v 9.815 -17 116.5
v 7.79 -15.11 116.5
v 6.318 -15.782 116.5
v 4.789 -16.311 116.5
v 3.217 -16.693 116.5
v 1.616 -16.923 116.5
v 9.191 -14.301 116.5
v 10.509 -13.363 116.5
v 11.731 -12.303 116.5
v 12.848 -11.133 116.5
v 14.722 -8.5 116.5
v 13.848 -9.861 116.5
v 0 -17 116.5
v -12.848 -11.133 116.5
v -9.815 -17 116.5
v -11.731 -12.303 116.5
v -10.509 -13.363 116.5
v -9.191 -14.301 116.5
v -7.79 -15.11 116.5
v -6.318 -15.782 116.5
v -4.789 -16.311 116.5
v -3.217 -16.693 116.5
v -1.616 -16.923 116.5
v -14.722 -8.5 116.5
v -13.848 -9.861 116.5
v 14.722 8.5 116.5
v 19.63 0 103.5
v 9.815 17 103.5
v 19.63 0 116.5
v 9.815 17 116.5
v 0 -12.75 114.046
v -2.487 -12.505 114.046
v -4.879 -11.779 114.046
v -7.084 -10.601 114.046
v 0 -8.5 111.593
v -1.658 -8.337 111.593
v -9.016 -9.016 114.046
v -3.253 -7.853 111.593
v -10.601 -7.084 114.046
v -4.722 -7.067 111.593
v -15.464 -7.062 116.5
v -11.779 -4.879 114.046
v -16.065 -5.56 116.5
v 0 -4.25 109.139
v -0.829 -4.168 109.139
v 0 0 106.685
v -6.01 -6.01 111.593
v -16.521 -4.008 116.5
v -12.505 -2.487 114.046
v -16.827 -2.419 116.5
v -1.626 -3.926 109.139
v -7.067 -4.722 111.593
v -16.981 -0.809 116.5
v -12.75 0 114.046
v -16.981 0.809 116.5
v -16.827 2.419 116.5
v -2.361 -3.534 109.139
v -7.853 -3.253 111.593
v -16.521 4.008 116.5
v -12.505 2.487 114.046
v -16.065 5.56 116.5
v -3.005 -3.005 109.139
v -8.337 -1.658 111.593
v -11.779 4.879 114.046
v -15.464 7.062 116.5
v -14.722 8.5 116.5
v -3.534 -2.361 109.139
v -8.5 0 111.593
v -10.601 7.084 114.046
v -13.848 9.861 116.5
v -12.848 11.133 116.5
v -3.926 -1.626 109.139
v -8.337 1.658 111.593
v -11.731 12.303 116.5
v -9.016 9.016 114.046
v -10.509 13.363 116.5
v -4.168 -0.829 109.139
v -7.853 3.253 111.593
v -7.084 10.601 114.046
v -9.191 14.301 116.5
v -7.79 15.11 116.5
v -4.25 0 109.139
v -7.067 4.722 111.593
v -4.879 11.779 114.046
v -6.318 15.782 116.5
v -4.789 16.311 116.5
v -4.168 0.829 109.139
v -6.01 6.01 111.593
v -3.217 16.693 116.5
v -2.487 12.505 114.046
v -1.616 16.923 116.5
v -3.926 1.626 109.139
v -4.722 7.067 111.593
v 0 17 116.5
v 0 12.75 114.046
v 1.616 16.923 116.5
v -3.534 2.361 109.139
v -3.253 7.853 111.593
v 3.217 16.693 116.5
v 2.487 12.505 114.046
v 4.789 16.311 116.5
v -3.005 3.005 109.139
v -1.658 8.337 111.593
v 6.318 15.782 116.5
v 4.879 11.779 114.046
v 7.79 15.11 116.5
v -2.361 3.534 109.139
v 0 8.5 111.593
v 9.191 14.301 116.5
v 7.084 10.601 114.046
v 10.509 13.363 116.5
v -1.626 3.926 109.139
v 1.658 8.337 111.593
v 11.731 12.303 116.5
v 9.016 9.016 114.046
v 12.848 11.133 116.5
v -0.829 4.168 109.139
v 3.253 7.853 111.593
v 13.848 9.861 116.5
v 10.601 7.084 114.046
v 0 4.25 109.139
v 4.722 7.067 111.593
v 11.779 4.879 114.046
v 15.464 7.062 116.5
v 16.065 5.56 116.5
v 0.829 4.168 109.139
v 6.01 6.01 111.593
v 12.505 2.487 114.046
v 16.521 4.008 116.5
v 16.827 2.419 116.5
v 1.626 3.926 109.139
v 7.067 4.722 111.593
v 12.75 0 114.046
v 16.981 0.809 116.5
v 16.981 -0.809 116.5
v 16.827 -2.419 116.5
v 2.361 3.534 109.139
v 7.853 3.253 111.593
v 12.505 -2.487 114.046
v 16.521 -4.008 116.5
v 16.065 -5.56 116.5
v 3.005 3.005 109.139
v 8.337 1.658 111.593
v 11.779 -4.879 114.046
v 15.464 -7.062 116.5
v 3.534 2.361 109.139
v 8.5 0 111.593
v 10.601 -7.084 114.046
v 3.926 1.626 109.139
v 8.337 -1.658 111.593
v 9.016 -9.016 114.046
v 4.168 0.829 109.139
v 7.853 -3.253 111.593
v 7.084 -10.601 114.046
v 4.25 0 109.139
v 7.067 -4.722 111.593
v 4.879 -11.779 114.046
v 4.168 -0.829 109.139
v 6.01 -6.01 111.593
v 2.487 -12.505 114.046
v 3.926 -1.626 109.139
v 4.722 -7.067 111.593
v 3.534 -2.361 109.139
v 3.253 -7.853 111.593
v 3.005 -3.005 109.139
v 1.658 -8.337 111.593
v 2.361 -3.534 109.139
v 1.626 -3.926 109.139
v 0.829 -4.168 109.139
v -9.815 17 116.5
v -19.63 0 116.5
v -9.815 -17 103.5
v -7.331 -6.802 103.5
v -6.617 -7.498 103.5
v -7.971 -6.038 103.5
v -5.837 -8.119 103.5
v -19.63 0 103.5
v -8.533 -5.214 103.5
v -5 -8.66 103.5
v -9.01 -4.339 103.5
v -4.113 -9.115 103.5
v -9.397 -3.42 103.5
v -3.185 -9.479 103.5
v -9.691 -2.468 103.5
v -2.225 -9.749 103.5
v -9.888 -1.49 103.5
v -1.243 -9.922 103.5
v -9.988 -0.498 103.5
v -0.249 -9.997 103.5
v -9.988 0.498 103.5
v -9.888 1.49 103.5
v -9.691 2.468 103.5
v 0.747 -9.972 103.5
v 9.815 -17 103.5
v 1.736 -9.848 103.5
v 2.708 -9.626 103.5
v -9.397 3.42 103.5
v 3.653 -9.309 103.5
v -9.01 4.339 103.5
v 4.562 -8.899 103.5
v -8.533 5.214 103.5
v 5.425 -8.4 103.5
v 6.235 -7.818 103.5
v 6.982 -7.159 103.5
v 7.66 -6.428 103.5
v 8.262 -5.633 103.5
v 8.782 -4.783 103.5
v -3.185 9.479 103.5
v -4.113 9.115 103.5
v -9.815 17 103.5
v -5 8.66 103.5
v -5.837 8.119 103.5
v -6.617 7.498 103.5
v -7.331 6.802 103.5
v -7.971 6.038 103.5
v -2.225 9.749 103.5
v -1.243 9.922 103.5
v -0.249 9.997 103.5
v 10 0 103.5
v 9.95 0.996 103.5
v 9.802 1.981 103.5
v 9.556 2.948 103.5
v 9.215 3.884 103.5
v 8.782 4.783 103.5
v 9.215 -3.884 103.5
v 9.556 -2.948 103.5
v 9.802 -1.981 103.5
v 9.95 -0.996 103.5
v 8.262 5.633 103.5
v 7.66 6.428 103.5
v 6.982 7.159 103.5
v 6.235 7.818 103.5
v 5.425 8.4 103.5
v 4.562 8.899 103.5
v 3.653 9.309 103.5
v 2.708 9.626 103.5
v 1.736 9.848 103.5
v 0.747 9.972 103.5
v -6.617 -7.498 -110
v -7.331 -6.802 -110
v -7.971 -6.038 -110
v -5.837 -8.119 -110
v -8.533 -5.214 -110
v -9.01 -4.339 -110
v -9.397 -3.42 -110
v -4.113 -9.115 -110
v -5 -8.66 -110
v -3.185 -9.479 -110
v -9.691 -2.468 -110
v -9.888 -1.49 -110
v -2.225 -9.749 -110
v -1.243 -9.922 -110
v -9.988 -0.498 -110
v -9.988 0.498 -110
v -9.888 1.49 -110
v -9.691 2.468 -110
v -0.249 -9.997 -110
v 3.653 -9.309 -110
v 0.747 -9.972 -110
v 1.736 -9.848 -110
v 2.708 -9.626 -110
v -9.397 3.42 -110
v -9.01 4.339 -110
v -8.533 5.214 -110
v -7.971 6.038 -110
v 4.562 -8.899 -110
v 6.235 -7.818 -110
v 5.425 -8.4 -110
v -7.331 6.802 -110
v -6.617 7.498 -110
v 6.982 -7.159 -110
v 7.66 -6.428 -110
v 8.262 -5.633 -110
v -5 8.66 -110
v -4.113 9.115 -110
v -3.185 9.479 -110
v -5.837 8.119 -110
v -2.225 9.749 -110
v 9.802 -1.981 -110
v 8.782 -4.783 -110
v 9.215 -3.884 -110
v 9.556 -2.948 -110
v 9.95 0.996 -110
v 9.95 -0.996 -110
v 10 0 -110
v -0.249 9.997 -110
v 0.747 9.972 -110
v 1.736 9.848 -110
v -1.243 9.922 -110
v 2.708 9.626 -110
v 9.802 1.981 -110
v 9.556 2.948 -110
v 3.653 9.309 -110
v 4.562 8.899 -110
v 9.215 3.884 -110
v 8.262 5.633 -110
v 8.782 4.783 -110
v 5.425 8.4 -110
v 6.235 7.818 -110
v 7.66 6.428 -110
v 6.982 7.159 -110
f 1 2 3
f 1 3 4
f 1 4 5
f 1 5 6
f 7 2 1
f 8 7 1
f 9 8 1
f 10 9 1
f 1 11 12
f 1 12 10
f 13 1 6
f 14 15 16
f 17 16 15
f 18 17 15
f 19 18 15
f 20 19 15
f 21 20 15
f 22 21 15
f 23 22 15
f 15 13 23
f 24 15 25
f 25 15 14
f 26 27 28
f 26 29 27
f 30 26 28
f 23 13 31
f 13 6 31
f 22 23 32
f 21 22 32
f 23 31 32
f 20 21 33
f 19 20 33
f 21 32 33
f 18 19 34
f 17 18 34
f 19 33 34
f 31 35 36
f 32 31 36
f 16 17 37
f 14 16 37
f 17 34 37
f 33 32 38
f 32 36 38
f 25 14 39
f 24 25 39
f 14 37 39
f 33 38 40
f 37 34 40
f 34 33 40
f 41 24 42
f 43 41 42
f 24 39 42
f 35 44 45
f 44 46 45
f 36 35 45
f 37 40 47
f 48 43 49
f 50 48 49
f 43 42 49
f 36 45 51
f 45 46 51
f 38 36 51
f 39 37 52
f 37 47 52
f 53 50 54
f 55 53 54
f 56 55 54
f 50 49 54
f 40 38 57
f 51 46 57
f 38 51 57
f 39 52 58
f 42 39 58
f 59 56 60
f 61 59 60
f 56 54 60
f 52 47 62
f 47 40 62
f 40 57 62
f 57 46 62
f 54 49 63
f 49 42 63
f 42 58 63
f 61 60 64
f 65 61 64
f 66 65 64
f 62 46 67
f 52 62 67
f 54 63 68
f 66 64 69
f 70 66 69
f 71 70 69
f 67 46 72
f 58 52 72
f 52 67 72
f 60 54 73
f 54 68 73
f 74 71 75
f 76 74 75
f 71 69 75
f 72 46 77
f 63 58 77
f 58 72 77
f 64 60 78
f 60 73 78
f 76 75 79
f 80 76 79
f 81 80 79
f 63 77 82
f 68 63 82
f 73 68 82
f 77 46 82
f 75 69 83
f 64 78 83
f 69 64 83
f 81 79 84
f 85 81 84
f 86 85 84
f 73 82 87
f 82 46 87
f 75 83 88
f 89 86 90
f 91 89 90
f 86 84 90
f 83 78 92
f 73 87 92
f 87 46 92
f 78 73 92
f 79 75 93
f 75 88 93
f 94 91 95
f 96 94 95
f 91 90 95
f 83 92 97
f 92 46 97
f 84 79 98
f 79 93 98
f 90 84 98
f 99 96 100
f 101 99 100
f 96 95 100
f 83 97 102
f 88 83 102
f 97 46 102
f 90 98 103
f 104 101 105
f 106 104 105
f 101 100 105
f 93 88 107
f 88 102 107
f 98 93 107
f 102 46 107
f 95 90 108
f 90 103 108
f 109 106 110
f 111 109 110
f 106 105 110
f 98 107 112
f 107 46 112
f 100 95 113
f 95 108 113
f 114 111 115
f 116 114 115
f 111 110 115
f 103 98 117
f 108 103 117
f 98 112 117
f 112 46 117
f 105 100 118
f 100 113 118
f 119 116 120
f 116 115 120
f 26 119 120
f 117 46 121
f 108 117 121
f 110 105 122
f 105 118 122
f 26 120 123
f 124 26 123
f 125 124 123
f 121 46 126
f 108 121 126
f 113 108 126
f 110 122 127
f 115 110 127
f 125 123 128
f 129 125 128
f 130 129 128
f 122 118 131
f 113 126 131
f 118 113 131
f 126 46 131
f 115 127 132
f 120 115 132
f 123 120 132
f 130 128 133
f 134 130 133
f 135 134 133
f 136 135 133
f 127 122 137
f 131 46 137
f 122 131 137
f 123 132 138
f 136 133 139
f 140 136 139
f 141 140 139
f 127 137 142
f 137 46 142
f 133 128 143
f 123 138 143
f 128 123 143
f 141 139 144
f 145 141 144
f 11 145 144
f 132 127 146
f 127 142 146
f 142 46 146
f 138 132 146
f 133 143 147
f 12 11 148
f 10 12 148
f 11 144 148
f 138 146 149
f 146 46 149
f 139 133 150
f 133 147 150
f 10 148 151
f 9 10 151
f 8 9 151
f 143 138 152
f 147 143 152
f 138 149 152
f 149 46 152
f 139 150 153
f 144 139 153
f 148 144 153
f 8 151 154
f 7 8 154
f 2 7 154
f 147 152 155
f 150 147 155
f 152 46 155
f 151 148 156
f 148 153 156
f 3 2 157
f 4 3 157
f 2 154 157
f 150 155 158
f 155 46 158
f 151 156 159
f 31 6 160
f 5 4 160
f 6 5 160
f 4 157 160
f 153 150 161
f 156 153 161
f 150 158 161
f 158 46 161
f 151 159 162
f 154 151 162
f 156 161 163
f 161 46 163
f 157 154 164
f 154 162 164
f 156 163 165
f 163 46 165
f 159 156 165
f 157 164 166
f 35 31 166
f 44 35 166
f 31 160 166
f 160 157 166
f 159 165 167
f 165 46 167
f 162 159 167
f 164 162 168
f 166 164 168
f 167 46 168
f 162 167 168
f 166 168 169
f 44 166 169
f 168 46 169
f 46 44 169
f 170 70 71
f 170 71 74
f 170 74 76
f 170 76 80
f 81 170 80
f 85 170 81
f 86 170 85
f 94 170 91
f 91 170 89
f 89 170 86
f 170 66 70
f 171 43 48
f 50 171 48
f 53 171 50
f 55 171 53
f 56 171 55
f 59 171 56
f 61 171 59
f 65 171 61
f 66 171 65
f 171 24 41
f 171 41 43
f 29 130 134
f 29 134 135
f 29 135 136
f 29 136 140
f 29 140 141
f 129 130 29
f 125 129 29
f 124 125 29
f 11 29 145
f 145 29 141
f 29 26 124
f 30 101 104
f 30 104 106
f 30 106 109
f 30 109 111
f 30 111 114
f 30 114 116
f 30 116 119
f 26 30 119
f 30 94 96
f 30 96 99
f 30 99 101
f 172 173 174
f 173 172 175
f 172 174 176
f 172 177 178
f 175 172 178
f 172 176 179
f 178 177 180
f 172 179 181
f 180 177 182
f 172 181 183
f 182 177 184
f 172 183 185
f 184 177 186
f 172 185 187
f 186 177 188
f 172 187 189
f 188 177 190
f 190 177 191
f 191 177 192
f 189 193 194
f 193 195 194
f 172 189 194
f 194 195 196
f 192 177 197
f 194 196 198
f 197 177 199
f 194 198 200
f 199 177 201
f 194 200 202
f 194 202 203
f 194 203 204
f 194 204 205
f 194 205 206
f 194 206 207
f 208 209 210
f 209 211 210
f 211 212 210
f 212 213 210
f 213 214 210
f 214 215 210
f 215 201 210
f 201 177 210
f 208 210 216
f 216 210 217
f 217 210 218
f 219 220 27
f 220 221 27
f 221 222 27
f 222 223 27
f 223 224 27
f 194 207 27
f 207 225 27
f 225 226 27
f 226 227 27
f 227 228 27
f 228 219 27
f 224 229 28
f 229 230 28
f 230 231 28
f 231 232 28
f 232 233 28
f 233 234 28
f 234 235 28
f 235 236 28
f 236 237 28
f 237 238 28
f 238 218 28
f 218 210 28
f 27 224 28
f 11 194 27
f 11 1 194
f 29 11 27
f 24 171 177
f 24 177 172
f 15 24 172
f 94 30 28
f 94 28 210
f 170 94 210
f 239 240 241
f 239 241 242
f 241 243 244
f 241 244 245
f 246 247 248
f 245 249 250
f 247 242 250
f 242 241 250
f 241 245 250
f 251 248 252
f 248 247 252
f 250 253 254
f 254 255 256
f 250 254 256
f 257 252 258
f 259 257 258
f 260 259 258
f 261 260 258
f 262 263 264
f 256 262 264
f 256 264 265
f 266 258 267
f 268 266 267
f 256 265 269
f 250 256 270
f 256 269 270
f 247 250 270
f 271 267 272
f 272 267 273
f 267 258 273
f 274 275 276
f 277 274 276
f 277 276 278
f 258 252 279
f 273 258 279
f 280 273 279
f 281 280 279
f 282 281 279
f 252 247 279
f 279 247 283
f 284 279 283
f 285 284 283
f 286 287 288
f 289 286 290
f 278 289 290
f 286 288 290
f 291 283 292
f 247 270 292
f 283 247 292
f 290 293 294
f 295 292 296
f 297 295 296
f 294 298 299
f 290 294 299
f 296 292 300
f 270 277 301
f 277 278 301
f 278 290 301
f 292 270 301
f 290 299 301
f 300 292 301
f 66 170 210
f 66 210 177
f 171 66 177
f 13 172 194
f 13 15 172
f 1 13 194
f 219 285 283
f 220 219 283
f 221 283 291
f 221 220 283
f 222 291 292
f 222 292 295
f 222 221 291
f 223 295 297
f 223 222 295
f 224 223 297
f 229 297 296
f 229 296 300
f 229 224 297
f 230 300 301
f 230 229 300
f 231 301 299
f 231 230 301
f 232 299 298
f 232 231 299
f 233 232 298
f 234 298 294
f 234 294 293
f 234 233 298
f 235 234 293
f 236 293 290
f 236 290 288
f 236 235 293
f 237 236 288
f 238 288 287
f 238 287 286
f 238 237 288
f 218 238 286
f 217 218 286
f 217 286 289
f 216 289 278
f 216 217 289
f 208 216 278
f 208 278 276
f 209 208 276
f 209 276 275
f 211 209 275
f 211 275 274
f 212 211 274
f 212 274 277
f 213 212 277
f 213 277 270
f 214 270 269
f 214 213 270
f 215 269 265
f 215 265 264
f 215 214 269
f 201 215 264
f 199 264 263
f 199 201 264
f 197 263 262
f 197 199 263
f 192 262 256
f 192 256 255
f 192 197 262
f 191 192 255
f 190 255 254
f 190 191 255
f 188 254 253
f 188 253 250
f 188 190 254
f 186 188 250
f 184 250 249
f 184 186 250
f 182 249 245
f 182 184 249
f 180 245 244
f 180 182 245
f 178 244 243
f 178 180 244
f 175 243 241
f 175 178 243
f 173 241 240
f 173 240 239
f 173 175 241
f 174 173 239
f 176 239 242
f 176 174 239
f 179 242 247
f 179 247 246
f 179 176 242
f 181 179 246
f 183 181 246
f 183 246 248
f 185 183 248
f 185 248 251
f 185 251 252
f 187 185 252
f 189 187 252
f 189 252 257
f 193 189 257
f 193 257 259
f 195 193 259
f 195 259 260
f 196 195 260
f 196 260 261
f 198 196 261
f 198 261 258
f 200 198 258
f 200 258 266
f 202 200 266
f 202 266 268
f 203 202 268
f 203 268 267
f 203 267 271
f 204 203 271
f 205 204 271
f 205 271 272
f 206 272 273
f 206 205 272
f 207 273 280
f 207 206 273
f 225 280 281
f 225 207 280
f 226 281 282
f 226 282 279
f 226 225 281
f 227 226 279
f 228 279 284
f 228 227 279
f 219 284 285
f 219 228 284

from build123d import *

# Parameters (mm, degrees)
SKETCH1_R           = 10
BOSS_EXTRUDE1_DEPTH = 110
BOSS_EXTRUDE2_DEPTH = 6.5


with BuildPart() as part:
    # Sketch1 → Boss-Extrude1 (new, symmetric)
    with BuildSketch(Plane.XY):
        Circle(SKETCH1_R)
    extrude(amount=BOSS_EXTRUDE1_DEPTH, both=True)

    # Sketch3 → Boss-Extrude2 (add, symmetric)
    with BuildSketch(Plane.XY.offset(110)):
        Polygon((19.629909152, 0), (9.814954576, 17), (-9.814954576, 17), (-19.629909152, 0), (-9.814954576, -17), (9.814954576, -17), align=None)
    extrude(amount=BOSS_EXTRUDE2_DEPTH, both=True)

    # Cut-Extrude1 cone 1 section (through the dimple's axis) → Cut-Extrude1 (revolve, cut)
    with BuildSketch(Plane(origin=(0, 0, 116.5), x_dir=(0, -1, 0), z_dir=(1, 0, 0))):
        Polygon((0, 0), (17, 0), (0, 9.814954576), align=None)
    revolve(axis=Axis((0, 0, 116.5), (0, 0, -1)), mode=Mode.SUBTRACT)


solid = part.part
